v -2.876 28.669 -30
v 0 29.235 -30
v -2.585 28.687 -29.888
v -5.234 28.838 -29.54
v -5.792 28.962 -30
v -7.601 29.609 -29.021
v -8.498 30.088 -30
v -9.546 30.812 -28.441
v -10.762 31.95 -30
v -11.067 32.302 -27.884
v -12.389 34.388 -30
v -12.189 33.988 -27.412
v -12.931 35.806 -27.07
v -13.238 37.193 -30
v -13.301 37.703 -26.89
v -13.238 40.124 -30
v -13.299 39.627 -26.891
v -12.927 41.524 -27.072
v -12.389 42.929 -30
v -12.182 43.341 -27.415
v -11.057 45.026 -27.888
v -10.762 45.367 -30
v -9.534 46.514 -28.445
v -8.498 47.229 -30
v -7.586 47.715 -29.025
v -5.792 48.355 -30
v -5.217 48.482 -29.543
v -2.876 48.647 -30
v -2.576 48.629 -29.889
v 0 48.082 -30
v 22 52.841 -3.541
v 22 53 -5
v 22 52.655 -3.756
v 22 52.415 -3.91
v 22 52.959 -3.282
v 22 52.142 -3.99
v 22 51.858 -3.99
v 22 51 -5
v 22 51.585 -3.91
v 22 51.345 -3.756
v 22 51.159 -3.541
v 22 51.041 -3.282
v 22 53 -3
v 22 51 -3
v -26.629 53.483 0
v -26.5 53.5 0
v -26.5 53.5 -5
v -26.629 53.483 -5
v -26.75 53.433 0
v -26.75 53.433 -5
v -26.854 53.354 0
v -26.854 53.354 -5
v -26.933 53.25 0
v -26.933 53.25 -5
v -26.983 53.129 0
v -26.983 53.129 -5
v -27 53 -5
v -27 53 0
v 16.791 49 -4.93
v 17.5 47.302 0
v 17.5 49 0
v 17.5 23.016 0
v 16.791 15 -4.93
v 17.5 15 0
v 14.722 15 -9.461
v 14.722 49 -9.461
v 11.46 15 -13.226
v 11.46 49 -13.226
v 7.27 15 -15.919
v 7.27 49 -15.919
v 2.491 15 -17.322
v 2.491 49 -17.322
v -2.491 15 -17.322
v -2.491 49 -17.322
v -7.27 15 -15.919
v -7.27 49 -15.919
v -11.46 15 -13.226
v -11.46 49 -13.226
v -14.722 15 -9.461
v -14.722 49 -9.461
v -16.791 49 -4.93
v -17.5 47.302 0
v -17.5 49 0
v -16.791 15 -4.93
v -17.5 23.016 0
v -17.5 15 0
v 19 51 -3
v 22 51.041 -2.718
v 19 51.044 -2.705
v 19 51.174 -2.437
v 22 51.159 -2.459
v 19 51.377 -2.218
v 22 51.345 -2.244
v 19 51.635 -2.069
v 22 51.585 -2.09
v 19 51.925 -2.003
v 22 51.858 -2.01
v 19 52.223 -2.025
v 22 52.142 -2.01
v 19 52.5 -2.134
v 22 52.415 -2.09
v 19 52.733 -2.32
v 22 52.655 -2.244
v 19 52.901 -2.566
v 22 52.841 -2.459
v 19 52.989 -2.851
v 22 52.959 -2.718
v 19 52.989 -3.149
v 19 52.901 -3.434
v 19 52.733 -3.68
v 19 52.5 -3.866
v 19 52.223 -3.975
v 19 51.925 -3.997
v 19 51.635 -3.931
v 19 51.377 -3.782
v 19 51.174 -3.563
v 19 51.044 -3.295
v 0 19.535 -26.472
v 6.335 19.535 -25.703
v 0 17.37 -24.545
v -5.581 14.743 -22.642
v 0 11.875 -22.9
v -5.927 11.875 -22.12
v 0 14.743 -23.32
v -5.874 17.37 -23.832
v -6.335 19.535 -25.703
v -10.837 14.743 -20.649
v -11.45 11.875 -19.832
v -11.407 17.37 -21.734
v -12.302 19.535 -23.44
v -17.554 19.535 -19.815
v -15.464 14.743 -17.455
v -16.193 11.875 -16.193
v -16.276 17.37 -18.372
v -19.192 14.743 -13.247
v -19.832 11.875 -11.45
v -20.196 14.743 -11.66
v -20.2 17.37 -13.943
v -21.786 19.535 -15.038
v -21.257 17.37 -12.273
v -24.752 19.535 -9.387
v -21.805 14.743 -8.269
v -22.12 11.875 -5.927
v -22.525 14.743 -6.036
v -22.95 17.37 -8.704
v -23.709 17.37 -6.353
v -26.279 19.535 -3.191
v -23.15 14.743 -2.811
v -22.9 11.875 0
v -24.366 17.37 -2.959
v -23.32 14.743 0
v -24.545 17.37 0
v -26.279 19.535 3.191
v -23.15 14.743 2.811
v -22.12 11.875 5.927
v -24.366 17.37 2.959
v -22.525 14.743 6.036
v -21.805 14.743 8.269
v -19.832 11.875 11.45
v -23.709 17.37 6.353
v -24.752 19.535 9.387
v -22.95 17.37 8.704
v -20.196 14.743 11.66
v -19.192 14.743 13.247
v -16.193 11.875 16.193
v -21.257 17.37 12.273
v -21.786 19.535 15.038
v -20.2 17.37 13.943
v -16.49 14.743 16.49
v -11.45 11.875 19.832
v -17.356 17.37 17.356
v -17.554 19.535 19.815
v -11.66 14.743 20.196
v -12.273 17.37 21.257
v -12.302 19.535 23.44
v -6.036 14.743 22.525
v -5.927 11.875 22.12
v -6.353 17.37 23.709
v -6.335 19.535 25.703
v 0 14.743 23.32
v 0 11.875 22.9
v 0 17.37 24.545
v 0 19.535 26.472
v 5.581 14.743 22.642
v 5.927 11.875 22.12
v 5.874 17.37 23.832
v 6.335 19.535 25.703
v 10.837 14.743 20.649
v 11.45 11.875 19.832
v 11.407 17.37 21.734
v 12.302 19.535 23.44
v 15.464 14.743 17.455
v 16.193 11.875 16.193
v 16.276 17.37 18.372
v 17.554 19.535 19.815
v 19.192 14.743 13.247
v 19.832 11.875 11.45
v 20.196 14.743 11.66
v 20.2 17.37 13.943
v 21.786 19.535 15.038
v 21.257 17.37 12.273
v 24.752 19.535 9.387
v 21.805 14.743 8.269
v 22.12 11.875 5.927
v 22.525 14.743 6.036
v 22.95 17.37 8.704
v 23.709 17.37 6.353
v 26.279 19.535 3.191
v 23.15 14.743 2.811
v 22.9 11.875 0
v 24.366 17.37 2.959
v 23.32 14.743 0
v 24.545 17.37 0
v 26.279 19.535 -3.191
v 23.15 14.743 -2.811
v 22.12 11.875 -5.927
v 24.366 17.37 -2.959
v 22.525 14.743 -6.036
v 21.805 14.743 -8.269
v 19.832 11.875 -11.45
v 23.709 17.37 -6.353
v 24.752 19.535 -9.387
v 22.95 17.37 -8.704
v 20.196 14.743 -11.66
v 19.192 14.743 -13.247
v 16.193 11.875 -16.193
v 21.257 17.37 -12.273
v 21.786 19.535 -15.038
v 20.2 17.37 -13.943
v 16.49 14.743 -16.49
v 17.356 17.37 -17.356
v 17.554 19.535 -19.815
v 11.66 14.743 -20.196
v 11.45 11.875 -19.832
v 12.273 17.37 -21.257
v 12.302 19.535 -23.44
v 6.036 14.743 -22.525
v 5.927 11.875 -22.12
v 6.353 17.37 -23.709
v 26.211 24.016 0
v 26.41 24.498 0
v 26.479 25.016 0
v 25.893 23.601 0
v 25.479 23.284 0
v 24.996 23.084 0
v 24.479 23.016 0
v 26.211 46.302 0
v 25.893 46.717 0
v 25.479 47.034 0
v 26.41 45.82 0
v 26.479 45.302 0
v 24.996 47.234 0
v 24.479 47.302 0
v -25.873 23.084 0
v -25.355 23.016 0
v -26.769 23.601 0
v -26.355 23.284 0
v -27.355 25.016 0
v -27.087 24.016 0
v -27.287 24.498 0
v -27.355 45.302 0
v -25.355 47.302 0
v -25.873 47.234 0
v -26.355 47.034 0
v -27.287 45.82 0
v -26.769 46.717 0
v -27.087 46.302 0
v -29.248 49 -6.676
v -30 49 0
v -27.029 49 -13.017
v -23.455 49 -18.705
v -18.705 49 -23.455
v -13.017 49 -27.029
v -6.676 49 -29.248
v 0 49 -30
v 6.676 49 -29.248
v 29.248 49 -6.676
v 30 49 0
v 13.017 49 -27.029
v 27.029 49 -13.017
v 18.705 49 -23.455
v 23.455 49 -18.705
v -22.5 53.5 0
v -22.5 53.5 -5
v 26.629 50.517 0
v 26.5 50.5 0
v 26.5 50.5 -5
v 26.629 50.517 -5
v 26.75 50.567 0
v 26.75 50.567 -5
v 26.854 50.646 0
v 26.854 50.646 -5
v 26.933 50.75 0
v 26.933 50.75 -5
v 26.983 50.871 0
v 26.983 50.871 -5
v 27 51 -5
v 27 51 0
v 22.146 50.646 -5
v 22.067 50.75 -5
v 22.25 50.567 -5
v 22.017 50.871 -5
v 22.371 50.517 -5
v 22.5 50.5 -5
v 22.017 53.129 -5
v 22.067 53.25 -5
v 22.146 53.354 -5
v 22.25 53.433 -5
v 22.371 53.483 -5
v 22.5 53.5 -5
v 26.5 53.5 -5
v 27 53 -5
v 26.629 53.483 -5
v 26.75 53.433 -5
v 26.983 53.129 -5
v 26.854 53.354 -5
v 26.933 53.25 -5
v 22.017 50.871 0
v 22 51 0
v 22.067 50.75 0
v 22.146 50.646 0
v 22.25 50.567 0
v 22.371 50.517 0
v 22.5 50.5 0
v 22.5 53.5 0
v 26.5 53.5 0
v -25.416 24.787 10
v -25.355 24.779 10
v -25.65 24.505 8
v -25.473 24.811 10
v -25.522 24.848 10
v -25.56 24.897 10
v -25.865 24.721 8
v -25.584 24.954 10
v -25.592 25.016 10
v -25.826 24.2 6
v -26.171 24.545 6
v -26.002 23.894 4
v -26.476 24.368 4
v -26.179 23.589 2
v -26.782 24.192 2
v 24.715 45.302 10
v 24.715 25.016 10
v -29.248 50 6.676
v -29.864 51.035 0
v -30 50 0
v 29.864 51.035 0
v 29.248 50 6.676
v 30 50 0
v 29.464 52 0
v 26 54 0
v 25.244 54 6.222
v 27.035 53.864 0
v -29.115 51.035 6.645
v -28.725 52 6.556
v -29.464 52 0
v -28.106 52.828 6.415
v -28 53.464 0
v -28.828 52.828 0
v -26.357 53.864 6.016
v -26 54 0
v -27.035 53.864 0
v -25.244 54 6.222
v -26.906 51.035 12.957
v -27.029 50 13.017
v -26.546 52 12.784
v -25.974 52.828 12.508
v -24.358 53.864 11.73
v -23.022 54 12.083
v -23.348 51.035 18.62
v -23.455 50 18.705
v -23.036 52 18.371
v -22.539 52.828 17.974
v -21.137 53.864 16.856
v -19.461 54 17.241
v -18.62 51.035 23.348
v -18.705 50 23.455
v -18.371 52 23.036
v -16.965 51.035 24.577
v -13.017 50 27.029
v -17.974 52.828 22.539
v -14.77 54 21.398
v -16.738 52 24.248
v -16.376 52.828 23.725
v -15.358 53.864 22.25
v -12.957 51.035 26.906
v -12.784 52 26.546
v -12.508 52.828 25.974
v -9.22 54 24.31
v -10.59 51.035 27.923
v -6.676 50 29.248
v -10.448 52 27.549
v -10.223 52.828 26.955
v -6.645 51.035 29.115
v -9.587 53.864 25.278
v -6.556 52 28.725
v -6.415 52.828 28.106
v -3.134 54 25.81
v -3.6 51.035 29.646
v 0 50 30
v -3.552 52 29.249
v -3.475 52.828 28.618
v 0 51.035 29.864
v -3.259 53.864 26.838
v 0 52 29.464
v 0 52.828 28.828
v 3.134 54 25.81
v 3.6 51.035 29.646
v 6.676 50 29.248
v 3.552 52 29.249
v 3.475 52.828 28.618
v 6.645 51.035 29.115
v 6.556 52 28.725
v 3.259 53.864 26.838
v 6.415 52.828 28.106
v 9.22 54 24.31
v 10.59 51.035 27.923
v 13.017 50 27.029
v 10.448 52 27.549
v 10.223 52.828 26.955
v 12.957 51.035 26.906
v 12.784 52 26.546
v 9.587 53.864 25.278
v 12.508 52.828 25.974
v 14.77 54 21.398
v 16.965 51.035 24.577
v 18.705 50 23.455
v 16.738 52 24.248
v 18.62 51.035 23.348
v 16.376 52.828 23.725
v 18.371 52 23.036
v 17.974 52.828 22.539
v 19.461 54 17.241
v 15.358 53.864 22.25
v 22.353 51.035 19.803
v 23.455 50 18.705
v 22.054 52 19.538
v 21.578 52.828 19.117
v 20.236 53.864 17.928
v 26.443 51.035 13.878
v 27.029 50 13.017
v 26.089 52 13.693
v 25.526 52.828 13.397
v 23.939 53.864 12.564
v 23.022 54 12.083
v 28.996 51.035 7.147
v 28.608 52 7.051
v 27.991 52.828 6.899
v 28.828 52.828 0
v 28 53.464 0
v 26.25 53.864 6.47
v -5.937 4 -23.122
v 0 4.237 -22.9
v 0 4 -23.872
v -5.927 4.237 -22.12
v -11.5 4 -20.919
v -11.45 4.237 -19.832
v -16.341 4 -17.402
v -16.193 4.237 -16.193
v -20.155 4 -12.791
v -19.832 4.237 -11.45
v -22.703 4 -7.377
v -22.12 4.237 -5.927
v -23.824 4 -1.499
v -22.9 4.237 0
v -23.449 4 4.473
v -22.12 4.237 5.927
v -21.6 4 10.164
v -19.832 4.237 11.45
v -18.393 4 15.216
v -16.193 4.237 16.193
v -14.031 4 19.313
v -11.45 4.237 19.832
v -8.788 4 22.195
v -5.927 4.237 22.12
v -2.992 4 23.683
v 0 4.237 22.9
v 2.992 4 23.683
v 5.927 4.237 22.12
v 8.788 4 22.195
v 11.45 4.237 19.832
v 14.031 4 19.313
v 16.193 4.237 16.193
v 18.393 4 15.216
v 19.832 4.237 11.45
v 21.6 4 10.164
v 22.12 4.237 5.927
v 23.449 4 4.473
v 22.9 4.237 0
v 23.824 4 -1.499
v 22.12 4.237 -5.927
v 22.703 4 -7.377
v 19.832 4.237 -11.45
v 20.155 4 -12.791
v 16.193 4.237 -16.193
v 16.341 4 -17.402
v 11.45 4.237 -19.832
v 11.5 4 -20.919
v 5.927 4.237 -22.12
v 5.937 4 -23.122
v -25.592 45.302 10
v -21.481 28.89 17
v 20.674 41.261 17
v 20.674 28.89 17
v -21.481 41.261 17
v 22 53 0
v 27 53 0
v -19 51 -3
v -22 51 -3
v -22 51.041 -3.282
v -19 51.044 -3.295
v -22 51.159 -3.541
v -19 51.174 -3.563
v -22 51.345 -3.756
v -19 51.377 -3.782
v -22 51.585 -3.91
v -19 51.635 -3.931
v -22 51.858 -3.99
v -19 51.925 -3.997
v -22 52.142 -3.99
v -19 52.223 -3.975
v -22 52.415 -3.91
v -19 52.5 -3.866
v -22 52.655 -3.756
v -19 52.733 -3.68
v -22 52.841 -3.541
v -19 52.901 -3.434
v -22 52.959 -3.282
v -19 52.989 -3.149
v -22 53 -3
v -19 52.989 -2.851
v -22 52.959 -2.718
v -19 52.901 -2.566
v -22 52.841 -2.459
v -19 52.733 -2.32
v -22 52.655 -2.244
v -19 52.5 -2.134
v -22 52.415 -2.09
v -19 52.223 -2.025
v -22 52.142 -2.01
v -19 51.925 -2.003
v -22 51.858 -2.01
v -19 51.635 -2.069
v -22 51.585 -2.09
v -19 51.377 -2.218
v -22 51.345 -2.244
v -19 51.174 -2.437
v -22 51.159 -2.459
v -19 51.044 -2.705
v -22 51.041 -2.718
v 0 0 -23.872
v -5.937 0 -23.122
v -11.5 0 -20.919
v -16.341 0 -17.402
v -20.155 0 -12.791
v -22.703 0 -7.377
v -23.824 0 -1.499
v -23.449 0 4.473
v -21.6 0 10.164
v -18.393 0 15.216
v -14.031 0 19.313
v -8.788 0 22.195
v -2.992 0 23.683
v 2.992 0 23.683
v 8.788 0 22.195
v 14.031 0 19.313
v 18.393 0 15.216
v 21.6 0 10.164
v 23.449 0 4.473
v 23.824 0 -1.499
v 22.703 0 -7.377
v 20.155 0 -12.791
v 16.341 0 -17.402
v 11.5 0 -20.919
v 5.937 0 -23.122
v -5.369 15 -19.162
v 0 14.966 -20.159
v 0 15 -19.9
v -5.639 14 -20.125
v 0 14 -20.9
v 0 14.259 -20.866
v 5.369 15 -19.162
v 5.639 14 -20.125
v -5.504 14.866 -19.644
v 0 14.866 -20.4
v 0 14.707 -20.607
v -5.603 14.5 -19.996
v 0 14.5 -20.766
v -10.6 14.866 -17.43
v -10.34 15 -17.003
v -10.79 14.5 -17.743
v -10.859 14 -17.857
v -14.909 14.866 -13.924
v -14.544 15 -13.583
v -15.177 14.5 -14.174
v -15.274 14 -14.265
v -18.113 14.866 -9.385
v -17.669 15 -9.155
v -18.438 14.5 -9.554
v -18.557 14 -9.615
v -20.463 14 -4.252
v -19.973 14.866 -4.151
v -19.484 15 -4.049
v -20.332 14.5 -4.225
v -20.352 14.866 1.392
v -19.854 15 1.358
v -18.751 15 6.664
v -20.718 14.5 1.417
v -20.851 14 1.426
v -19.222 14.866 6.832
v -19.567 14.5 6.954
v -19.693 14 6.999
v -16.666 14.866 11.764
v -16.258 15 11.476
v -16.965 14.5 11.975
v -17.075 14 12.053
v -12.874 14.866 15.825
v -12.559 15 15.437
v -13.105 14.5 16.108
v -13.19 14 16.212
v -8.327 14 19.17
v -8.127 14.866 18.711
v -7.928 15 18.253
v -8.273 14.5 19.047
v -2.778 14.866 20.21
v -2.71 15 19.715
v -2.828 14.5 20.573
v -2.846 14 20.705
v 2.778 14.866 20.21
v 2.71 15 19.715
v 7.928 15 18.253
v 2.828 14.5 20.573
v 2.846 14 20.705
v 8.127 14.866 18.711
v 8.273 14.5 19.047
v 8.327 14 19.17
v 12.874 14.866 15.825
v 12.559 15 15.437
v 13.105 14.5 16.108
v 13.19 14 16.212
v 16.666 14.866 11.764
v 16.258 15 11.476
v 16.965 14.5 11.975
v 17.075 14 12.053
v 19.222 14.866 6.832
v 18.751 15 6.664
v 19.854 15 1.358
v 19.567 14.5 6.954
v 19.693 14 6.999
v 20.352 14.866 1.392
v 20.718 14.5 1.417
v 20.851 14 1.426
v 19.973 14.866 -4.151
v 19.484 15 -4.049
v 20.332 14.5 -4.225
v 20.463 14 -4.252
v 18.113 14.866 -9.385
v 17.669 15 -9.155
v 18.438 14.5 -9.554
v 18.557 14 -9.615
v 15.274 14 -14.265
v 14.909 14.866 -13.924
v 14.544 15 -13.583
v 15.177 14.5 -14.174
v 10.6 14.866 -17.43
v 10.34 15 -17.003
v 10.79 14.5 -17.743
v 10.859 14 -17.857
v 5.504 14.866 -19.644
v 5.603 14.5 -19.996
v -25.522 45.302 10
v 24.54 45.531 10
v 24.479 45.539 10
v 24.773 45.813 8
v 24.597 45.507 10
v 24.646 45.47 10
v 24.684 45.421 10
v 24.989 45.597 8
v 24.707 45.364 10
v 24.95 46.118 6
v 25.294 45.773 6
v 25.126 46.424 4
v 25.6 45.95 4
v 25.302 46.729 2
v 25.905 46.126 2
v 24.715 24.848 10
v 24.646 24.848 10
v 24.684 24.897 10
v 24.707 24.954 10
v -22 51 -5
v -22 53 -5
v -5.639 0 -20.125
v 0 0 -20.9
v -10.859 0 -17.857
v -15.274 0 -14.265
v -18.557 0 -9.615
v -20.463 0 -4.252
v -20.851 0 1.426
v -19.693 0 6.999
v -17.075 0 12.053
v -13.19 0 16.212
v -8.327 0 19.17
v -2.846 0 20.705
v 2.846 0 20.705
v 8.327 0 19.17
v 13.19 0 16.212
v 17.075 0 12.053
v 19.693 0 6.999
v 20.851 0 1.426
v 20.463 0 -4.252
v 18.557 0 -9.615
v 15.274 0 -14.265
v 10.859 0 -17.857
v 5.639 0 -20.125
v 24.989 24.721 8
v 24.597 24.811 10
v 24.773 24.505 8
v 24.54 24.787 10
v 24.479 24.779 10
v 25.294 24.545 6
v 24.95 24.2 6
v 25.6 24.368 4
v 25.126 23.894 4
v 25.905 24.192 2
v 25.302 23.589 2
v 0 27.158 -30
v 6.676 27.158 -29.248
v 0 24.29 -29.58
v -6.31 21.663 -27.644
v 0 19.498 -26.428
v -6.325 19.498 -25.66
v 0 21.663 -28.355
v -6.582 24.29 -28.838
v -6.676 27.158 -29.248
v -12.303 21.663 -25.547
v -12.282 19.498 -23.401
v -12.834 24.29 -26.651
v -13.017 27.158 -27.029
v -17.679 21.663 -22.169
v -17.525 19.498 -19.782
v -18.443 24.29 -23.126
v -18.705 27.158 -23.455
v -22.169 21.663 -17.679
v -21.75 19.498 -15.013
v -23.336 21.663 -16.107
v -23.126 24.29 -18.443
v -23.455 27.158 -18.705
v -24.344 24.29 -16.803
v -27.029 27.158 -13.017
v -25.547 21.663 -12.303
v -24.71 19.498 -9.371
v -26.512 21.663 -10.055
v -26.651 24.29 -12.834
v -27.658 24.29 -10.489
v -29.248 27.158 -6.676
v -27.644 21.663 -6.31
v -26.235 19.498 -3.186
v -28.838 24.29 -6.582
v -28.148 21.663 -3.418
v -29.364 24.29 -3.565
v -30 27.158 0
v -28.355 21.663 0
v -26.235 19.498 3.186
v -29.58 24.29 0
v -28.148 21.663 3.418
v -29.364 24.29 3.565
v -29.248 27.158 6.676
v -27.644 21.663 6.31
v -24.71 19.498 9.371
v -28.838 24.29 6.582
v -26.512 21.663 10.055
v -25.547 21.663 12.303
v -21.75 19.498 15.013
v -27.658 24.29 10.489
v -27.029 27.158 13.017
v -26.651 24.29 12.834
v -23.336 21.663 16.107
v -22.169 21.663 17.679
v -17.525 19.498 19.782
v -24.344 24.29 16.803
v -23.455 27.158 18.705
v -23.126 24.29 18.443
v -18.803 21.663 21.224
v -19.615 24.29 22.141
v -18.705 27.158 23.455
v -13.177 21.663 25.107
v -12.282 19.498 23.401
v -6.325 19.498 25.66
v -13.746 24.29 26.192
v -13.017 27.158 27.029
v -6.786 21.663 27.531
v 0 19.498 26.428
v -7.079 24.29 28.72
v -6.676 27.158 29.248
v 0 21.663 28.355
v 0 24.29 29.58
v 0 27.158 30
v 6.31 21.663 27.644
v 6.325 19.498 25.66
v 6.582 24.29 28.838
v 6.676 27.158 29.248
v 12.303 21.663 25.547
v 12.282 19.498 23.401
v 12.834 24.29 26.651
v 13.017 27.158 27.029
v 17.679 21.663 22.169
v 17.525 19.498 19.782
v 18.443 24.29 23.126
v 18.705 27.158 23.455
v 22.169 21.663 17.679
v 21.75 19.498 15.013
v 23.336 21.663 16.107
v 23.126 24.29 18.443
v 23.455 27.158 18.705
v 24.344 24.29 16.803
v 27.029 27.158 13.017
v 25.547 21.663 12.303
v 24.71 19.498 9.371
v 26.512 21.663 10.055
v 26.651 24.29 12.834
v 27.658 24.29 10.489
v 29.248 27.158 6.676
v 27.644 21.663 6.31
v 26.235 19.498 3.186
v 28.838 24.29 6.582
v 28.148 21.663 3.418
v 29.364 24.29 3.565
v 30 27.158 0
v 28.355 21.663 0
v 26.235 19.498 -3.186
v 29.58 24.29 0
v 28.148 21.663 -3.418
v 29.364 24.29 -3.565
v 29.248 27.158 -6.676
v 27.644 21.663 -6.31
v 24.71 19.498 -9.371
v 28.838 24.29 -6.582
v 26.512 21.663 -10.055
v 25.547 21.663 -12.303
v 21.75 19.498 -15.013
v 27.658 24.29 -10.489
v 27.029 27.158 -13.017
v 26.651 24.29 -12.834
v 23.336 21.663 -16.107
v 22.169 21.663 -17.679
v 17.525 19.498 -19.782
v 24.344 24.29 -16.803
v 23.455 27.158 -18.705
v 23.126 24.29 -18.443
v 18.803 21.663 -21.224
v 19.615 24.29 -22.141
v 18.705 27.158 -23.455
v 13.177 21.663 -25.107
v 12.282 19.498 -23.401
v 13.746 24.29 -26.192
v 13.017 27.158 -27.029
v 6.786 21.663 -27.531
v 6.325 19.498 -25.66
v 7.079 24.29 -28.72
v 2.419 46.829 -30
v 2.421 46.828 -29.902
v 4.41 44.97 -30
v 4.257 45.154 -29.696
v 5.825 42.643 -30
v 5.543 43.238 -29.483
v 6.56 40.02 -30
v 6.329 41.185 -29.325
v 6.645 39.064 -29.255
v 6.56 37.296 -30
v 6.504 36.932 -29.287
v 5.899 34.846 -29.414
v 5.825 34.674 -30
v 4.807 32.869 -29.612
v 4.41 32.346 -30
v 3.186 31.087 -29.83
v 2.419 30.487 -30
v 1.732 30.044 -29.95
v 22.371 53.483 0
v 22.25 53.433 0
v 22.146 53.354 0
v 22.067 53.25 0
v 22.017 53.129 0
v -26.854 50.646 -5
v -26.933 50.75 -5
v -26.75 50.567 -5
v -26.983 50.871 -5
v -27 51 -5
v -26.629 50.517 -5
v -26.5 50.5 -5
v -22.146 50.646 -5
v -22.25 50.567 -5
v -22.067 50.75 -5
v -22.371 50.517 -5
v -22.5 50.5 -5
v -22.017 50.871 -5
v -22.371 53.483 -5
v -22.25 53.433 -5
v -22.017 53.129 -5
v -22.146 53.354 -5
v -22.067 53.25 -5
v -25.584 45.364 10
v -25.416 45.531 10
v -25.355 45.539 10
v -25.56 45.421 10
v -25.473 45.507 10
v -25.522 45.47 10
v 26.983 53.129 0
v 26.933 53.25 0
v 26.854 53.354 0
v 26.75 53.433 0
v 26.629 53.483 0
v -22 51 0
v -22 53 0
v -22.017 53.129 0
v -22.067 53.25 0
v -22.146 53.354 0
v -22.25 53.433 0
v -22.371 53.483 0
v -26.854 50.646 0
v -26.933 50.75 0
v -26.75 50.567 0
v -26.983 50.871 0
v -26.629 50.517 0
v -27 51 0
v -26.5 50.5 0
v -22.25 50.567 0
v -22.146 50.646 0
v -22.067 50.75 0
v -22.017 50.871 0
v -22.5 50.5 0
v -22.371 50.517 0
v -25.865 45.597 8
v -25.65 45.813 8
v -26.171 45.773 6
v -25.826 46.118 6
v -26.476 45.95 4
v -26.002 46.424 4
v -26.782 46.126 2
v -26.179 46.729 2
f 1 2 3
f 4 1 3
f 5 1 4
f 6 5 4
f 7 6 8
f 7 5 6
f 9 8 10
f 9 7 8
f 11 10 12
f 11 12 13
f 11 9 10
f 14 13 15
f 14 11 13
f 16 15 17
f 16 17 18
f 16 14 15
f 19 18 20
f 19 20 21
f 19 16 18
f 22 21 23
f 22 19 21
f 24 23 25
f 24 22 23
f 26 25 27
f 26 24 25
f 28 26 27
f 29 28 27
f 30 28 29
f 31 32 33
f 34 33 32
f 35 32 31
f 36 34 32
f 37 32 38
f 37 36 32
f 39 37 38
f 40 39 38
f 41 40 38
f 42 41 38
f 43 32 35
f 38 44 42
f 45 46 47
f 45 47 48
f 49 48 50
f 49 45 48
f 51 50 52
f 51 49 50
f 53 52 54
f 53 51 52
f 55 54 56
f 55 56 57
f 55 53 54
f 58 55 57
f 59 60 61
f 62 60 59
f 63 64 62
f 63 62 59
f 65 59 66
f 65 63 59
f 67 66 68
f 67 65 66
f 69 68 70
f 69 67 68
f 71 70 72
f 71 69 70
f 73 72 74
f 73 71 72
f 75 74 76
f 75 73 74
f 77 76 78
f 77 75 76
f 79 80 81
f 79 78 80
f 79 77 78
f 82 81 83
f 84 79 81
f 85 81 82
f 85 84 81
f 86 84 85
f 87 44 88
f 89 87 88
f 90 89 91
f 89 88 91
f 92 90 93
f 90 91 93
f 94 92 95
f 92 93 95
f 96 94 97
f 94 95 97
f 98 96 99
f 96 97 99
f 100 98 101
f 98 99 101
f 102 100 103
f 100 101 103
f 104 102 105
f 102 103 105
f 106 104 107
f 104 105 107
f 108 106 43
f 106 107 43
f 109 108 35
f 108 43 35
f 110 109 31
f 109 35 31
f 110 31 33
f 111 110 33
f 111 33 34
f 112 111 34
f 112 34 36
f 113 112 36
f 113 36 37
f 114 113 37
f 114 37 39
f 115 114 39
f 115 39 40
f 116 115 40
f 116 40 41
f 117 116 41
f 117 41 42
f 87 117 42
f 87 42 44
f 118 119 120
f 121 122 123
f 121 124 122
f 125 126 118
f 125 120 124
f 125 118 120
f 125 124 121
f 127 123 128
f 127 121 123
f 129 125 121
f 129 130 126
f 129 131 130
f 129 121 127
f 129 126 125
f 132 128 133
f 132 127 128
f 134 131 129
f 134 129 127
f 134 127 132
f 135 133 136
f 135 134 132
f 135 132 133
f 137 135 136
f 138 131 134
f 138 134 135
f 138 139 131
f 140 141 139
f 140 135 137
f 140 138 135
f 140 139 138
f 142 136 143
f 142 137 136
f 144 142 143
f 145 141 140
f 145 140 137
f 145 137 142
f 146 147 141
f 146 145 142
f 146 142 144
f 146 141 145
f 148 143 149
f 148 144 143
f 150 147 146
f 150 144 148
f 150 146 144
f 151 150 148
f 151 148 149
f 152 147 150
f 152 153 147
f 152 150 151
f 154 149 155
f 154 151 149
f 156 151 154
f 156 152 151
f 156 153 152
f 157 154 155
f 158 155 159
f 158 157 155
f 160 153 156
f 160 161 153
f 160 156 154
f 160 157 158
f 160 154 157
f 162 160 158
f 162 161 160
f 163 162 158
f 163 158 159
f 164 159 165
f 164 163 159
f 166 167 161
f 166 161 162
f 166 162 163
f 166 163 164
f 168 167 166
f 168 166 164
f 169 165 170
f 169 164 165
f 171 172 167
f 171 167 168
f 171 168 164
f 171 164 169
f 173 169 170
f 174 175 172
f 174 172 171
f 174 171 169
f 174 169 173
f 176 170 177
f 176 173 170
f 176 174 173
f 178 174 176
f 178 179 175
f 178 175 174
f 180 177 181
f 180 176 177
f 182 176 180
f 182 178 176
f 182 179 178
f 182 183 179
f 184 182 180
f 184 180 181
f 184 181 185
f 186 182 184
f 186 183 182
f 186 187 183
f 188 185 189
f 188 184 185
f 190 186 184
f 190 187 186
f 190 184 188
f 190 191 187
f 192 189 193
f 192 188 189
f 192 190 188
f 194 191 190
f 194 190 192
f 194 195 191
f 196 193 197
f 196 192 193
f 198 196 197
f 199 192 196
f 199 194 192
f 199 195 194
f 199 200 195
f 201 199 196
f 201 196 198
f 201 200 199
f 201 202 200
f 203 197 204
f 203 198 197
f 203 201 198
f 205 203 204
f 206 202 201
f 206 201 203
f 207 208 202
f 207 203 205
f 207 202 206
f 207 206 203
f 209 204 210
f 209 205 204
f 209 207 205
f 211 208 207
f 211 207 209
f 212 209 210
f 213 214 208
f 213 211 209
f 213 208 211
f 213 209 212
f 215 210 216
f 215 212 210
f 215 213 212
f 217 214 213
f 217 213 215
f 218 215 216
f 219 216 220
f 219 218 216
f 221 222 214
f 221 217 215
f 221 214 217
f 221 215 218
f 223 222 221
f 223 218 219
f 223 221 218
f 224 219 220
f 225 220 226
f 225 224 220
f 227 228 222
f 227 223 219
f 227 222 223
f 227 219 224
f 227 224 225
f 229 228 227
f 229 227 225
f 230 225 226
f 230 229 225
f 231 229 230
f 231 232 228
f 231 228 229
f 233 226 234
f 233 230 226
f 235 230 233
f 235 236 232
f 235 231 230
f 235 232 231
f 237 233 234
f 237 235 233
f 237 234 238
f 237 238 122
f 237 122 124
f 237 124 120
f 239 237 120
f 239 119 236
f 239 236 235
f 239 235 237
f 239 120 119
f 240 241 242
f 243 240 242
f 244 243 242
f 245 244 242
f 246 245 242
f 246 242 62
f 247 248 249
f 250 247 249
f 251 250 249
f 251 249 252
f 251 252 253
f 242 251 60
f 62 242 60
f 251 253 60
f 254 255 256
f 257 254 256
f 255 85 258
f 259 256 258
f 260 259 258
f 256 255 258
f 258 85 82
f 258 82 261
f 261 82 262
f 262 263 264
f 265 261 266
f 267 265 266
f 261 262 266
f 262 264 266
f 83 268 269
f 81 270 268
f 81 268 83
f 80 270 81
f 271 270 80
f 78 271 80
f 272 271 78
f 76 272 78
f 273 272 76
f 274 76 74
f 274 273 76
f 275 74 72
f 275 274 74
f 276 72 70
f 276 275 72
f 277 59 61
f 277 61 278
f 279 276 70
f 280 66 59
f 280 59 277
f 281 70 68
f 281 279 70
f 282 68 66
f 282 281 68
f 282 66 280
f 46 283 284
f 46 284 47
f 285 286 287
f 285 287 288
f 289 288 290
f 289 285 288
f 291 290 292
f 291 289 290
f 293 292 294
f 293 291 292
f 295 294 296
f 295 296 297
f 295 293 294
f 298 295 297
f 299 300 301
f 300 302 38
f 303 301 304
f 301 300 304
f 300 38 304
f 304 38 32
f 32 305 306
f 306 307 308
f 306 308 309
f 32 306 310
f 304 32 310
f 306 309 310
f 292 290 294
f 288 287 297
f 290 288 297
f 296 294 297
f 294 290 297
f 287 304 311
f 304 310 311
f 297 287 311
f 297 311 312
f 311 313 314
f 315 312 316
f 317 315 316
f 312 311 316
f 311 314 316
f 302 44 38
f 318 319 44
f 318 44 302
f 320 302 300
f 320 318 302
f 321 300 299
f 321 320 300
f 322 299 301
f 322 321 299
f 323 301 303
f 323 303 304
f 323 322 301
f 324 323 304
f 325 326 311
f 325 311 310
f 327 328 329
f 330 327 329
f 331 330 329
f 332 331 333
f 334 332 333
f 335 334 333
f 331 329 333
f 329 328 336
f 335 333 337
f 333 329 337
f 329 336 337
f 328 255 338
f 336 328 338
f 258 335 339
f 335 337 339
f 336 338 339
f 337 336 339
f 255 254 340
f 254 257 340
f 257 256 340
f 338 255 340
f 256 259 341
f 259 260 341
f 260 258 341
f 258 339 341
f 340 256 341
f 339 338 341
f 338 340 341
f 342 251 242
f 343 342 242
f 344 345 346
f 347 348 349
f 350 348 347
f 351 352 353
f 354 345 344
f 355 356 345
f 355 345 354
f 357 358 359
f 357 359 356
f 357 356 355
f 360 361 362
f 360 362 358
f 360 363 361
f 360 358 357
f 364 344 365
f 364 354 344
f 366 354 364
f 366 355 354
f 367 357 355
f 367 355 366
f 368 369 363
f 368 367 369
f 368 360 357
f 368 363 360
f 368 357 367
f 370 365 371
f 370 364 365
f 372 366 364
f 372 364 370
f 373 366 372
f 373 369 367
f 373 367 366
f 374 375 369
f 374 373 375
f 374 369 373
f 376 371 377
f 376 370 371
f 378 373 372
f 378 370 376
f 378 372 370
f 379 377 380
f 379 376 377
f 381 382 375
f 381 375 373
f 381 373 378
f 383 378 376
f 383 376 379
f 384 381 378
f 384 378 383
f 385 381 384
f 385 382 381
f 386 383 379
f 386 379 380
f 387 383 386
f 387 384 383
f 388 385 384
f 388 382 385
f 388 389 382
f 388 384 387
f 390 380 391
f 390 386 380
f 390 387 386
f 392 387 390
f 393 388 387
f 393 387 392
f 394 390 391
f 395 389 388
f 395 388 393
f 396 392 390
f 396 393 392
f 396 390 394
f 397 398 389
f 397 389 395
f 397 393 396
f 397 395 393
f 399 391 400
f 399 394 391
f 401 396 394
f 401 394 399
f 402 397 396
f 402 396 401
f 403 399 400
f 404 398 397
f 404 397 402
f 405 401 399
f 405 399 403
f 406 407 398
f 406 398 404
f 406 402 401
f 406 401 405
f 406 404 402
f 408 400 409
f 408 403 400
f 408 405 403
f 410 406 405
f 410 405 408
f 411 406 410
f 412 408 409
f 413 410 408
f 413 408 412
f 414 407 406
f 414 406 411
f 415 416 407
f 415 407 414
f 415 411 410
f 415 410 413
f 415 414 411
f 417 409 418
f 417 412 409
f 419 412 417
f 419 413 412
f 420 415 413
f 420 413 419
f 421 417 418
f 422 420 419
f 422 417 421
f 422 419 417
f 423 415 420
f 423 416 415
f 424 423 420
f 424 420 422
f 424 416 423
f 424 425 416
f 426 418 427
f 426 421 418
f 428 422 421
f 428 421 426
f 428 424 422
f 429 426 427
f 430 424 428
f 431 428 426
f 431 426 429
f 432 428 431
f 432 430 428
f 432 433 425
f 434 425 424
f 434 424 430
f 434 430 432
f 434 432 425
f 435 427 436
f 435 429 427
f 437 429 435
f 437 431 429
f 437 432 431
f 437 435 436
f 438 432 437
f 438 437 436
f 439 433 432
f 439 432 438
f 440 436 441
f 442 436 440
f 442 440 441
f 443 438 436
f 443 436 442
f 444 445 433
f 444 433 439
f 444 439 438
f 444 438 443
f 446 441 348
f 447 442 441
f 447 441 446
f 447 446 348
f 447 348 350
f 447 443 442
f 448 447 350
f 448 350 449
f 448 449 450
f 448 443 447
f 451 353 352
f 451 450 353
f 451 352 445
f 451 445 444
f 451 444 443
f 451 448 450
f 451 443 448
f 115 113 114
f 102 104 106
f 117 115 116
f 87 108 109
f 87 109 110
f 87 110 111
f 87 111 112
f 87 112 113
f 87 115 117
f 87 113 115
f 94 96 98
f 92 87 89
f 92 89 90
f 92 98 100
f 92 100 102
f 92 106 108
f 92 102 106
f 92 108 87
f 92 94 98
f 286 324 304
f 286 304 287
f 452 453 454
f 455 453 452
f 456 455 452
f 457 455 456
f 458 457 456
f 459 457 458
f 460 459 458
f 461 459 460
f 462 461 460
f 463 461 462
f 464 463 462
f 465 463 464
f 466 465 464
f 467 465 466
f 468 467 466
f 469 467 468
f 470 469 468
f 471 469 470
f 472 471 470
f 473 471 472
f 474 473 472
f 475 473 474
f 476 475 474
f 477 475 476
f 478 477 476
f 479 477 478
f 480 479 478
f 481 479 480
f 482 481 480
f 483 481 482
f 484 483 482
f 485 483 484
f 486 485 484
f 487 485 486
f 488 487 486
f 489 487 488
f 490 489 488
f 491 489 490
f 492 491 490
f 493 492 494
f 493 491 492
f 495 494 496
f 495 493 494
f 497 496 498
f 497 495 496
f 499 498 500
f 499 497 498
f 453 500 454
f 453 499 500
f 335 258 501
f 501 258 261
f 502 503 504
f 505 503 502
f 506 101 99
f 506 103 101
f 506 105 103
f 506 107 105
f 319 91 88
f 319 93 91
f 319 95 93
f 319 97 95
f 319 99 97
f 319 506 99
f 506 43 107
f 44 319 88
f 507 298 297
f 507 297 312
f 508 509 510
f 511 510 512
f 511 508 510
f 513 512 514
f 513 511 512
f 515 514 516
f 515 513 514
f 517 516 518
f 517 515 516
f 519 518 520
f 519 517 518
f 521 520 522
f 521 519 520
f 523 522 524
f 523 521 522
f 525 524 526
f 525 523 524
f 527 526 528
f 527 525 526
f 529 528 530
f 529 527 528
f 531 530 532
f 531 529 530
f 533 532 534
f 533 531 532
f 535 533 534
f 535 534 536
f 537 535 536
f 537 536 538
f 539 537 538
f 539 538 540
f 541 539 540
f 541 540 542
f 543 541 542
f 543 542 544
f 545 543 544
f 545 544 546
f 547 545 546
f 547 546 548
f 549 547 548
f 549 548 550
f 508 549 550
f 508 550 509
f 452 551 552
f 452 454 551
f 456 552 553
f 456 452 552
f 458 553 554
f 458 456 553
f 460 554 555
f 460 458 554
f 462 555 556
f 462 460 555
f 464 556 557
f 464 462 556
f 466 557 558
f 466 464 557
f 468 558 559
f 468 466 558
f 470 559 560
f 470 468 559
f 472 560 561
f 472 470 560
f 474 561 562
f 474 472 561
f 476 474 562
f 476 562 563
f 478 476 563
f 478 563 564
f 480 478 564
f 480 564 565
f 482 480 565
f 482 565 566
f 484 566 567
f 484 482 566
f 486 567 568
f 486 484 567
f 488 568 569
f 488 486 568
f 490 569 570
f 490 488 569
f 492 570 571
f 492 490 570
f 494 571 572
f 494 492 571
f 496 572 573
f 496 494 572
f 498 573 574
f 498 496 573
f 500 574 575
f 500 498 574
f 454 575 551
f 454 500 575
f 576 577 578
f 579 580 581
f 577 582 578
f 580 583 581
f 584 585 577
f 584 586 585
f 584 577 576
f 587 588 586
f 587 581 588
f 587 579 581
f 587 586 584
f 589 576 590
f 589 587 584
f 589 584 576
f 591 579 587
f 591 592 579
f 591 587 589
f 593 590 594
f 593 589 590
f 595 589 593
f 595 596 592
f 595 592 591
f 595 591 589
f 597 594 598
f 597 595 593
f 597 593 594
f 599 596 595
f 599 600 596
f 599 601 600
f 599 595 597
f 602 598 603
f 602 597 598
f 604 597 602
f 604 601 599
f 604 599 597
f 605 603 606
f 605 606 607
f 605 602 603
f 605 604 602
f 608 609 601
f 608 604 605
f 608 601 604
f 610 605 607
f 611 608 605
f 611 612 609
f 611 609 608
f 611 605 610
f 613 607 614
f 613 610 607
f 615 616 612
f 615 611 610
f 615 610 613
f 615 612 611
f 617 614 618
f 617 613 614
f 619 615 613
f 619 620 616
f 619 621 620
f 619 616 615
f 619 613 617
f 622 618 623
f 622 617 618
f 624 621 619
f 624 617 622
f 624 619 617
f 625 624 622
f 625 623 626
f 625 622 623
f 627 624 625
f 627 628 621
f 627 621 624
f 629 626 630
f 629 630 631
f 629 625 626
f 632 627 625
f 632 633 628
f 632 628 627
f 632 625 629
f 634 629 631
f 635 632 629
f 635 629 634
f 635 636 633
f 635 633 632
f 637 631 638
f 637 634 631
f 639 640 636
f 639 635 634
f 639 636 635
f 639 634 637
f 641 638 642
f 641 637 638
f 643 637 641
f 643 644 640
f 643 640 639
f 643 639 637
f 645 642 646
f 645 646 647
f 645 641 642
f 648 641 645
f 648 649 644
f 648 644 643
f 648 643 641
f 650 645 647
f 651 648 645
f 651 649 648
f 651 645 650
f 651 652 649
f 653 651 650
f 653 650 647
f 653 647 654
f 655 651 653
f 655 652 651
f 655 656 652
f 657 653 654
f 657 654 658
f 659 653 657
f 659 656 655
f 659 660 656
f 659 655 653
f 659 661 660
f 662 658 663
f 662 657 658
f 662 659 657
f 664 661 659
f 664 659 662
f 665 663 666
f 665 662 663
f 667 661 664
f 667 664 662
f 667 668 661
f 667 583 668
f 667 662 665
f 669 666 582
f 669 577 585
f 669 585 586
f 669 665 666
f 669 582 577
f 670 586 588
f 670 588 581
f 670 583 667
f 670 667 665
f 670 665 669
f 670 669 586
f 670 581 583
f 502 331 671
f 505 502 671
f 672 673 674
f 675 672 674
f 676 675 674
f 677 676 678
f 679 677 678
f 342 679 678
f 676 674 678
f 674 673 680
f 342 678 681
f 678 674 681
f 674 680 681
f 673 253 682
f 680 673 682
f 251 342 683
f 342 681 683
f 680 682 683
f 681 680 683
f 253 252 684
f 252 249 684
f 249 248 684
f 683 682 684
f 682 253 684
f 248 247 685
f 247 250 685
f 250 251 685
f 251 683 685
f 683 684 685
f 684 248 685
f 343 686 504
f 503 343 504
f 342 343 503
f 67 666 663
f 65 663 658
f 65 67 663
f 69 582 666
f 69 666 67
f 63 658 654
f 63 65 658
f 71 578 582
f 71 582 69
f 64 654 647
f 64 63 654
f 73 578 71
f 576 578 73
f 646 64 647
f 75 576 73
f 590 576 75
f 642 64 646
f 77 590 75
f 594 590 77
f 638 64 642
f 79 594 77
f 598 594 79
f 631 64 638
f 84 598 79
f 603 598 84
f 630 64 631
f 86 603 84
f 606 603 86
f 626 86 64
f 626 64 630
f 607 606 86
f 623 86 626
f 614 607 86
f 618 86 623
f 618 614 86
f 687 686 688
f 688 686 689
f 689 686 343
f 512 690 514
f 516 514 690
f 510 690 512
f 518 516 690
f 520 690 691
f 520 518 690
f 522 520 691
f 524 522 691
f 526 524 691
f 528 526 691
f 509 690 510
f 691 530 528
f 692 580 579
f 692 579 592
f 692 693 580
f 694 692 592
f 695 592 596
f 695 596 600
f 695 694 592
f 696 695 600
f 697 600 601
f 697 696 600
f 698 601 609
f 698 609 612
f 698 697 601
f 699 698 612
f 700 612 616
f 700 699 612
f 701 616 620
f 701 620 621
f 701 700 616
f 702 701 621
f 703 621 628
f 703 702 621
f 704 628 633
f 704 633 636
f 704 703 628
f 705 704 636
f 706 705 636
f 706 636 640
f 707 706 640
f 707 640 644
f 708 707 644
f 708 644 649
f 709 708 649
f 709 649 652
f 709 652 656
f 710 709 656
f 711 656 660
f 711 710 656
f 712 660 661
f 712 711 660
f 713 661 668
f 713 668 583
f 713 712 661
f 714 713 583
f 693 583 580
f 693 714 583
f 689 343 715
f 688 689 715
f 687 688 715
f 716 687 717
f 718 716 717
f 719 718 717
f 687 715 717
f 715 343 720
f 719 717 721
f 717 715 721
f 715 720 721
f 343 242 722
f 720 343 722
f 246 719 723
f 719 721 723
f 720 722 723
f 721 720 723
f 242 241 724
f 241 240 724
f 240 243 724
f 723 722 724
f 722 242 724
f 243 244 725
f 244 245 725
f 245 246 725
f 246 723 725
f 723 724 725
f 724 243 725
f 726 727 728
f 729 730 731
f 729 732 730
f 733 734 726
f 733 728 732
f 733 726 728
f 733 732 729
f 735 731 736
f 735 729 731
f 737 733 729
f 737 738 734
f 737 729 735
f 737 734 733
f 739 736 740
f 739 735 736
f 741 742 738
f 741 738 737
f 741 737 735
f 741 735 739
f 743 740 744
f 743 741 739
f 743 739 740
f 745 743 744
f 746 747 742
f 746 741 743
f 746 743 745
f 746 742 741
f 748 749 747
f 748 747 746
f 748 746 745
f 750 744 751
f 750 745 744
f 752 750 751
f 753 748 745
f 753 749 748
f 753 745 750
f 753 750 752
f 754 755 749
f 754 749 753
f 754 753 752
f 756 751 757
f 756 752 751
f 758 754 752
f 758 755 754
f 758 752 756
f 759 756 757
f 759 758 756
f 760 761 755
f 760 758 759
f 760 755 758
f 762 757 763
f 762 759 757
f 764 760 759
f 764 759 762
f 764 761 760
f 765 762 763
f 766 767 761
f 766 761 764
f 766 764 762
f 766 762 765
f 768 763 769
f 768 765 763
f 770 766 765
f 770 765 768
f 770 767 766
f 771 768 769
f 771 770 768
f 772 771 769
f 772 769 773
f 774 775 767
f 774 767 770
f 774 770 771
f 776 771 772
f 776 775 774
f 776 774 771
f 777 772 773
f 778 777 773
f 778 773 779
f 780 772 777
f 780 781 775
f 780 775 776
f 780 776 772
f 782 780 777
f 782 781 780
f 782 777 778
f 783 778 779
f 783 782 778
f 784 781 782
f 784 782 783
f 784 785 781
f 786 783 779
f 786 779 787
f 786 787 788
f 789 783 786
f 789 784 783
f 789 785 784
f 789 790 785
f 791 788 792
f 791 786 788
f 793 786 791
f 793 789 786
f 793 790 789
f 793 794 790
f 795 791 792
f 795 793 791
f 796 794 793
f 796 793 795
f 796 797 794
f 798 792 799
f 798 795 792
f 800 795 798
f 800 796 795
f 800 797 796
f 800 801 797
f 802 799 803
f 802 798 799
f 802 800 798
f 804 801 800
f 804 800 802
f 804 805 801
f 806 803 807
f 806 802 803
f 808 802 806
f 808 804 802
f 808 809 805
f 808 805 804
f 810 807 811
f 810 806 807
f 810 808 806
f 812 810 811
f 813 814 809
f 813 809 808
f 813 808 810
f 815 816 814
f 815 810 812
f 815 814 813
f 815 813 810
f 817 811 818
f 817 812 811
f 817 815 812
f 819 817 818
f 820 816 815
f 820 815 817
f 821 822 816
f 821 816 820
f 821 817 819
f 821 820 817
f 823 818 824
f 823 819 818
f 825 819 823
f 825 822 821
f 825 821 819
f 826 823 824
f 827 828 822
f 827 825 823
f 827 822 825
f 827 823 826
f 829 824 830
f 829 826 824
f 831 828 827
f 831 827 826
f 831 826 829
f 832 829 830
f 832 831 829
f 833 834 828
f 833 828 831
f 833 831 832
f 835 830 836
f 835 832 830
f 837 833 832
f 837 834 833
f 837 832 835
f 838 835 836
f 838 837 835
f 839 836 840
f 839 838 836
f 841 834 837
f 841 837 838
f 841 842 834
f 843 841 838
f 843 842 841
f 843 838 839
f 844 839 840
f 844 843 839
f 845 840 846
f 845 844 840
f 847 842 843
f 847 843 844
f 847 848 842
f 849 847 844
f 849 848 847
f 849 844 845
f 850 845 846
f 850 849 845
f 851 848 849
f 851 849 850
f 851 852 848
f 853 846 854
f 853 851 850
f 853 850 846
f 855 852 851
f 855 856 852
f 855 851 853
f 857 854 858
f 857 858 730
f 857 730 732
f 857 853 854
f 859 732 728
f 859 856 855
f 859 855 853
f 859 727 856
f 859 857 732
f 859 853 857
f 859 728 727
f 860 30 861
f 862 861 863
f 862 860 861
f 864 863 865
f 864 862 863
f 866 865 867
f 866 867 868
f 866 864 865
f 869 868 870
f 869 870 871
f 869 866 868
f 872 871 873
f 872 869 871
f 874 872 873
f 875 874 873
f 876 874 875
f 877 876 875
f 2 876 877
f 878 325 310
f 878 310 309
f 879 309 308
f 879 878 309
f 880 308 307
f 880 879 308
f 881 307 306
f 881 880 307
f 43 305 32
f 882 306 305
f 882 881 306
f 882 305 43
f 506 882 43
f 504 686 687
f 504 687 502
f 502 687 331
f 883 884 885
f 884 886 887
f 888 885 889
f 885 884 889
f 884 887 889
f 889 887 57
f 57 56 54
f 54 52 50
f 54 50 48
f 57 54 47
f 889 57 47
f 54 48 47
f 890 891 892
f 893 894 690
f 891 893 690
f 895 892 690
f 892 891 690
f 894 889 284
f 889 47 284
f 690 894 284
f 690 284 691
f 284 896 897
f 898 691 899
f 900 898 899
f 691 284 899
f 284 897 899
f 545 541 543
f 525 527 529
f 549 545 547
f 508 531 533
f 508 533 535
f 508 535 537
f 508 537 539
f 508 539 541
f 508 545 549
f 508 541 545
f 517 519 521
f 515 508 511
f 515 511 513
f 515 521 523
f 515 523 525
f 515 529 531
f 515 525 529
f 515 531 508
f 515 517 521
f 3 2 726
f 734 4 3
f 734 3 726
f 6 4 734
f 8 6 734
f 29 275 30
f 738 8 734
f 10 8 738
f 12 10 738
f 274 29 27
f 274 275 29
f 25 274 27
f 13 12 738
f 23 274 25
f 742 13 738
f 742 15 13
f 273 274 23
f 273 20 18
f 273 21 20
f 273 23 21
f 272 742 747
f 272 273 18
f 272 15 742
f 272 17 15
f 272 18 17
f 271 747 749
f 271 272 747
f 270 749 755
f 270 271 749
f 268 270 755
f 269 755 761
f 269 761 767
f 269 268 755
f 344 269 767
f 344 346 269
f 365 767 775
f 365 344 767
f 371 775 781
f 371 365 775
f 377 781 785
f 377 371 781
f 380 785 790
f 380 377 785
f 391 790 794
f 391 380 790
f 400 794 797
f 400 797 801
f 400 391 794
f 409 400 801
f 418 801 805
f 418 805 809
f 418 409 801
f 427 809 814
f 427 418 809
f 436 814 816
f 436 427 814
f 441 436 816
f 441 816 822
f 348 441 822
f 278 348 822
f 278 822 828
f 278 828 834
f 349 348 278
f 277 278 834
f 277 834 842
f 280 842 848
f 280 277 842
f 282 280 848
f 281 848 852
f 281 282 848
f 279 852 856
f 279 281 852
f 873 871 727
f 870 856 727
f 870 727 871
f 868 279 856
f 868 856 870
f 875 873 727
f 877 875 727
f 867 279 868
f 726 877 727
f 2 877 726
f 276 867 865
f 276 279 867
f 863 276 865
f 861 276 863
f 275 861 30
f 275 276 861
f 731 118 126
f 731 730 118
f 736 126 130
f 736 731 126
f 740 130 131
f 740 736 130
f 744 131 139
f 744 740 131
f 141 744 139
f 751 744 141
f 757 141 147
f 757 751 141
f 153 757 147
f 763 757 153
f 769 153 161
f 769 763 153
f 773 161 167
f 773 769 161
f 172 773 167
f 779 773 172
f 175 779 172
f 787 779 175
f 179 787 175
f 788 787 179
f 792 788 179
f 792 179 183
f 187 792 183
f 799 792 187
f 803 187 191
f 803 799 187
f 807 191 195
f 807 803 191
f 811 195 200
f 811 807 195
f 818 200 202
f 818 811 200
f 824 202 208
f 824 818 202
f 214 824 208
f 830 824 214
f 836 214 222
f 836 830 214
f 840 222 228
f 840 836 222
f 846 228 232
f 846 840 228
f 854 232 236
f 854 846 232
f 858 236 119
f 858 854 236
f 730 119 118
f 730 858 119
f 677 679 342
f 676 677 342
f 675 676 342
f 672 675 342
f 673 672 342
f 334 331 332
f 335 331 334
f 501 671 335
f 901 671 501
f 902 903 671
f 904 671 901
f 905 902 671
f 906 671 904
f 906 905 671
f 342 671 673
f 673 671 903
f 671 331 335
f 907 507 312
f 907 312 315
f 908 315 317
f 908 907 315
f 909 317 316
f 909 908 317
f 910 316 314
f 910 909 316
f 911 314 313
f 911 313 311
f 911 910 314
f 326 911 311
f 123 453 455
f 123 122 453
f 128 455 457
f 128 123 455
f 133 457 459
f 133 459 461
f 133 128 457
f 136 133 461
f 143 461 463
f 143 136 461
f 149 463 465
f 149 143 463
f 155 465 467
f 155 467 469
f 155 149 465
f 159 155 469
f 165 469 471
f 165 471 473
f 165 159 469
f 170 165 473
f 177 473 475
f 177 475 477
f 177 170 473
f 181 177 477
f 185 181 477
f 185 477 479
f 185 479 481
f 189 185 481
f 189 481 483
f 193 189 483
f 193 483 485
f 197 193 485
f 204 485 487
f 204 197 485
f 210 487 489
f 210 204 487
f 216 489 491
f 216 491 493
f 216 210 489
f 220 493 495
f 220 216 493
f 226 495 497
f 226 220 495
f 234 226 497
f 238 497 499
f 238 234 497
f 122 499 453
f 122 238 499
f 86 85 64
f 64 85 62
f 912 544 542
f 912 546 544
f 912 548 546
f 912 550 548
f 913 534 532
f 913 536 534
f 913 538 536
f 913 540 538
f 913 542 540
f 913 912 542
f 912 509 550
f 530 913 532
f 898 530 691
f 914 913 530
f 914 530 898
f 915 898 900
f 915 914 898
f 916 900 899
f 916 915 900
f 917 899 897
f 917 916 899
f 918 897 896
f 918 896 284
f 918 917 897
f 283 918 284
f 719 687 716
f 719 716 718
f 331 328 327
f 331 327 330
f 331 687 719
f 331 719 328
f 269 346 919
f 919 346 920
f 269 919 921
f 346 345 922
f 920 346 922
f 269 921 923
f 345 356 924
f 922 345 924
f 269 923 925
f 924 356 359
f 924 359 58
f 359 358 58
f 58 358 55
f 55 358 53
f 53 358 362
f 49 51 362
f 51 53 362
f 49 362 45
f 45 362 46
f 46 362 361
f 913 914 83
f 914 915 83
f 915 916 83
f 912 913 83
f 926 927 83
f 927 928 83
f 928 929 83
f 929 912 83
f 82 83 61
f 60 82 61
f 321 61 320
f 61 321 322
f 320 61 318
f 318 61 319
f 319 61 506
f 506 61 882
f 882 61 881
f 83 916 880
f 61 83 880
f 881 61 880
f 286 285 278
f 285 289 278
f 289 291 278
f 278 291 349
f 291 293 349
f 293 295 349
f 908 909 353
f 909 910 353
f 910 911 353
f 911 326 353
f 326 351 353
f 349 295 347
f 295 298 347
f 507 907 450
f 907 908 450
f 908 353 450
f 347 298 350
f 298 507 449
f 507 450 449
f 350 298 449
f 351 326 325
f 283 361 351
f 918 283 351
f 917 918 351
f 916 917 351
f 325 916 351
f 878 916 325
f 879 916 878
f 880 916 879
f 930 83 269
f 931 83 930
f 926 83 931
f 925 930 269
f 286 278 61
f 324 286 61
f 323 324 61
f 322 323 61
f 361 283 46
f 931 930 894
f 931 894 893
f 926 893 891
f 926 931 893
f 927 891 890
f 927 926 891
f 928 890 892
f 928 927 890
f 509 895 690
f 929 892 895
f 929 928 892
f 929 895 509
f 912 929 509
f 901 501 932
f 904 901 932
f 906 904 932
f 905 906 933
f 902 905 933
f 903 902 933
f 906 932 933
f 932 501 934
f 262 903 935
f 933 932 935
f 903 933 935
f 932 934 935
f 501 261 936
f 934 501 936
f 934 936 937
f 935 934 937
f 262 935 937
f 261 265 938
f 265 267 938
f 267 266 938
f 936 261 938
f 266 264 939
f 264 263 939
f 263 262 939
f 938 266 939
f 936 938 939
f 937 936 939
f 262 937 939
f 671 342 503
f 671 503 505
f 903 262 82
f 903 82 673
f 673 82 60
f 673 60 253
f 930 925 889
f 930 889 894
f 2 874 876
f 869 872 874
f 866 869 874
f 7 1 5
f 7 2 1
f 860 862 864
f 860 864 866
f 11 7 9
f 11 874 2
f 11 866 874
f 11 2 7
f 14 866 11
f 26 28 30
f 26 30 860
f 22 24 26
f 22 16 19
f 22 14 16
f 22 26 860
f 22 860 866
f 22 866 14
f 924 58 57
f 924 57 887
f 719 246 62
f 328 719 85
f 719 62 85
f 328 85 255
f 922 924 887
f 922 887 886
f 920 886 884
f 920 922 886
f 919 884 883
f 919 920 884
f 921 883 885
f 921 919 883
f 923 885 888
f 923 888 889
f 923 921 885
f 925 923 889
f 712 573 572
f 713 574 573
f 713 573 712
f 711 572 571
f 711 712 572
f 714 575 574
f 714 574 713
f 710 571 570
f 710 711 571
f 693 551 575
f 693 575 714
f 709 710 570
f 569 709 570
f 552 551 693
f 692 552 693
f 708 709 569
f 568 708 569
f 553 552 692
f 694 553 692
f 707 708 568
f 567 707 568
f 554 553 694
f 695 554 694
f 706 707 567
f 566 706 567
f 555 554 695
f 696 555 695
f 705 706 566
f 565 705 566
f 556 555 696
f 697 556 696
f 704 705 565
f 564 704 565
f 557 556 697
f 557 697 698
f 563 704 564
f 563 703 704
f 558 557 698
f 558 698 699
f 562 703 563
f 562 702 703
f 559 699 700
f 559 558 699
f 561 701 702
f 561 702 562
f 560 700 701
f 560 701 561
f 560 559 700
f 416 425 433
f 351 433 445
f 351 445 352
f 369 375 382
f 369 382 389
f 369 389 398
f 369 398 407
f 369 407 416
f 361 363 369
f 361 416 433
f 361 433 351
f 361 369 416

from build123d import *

# Parameters (mm, degrees)
SKETCH10_R              = 10
BOSS_EXTRUDE1_DEPTH     = 5
CUT_EXTRUDE3_DEPTH      = 45
CUT_EXTRUDE3_DEPTH_BACK = 20
CUT_EXTRUDE5_DEPTH      = 5
BOSS_EXTRUDE2_DEPTH     = 5
SKETCH14_R              = 1
BOSS_EXTRUDE3_DEPTH     = 3
BOSS_EXTRUDE4_START     = 3
SKETCH15_R              = 1
BOSS_EXTRUDE4_DEPTH     = 3
CUT_EXTRUDE6_DEPTH      = 10
CUT_EXTRUDE6_DRAFT      = -10
SKETCH18_W              = 50.237541655
SKETCH18_H              = 20.454146011
CUT_EXTRUDE7_DEPTH      = 7
CUT_EXTRUDE7_DRAFT      = -30


with BuildPart() as part:
    # Sketch1 → Revolve1 (revolve)
    with BuildSketch(Plane.XY, mode=Mode.PRIVATE) as revolve1_sk:
        with BuildLine():
            Line((20.9, 0), (23.871591838, 0))
            Line((23.871591838, 0), (23.871591838, 4))
            Line((23.871591838, 4), (22.9, 4.236662843))
            Line((22.9, 4.236662843), (22.9, 11.874576818))
            ThreePointArc((22.9, 11.874576818), (23.83692213, 16.100759435), (26.472123903, 19.535021249))
            Line((26.472123903, 19.535021249), (26.427876097, 19.497892931))
            ThreePointArc((26.427876097, 19.497892931), (29.06307787, 22.932154745), (30, 27.158337362))
            Line((30, 27.158337362), (30, 50))
            ThreePointArc((30, 50), (28.828427125, 52.828427125), (26, 54))
            Line((26, 54), (0, 54))
            Line((0, 54), (0, 15))
            Line((0, 15), (19.9, 15))
            ThreePointArc((19.9, 15), (20.607106781, 14.707106781), (20.9, 14))
            Line((20.9, 14), (20.9, 0))
        make_face()
    revolve(revolve1_sk.sketch.rotate(Axis((0, 0, 0), (0, 1, 0)), 90), axis=Axis((0, 0, 0), (0, 1, 0)))

    # Sketch10 → Boss-Extrude1 (add)
    with BuildSketch(Plane(origin=(0, 0, -30), x_dir=(-1, 0, 0), z_dir=(0, 0, -1))):
        with Locations((3.346345887, 38.658337362)):
            Circle(SKETCH10_R)
    extrude(amount=-BOSS_EXTRUDE1_DEPTH)

    # Sketch11 → Cut-Extrude3 (cut, two sides: drawn at the far end of the back side and taken through both)
    with BuildSketch(Plane(origin=(0, 17, 0), x_dir=(1, 0, 0), z_dir=(0, 1, 0)).offset(-CUT_EXTRUDE3_DEPTH_BACK)):
        with BuildLine():
            Line((-17.5, 0), (17.5, 0))
            ThreePointArc((17.5, 0), (0, 17.5), (-17.5, 0))
        make_face()
    extrude(amount=CUT_EXTRUDE3_DEPTH + CUT_EXTRUDE3_DEPTH_BACK, mode=Mode.SUBTRACT)

    # Sketch9 → Cut-Extrude5 (cut)
    with BuildSketch(Plane(origin=(0, 54, 0), x_dir=(1, 0, 0), z_dir=(0, 1, 0))):
        with BuildLine():
            Line((-30, 0), (30, 0))
            ThreePointArc((30, 0), (0, 30), (-30, 0))
        make_face()
    extrude(amount=-CUT_EXTRUDE5_DEPTH, mode=Mode.SUBTRACT)

    # Sketch13 → Boss-Extrude2 (add)
    with BuildSketch(Plane(origin=(0, 0, 0), x_dir=(-1, 0, 0), z_dir=(0, 0, -1))):
        with BuildLine():
            Line((22.5, 53.5), (26.5, 53.5))
            ThreePointArc((26.5, 53.5), (26.853553391, 53.353553391), (27, 53))
            Line((27, 53), (27, 51))
            ThreePointArc((27, 51), (26.853553391, 50.646446609), (26.5, 50.5))
            Line((26.5, 50.5), (22.5, 50.5))
            ThreePointArc((22.5, 50.5), (22.146446609, 50.646446609), (22, 51))
            Line((22, 51), (22, 53))
            ThreePointArc((22, 53), (22.146446609, 53.353553391), (22.5, 53.5))
        make_face()
        with BuildLine():
            Line((-26.5, 53.5), (-22.5, 53.5))
            ThreePointArc((-22.5, 53.5), (-22.146446609, 53.353553391), (-22, 53))
            Line((-22, 53), (-22, 51))
            ThreePointArc((-22, 51), (-22.146446609, 50.646446609), (-22.5, 50.5))
            Line((-22.5, 50.5), (-26.5, 50.5))
            ThreePointArc((-26.5, 50.5), (-26.853553391, 50.646446609), (-27, 51))
            Line((-27, 51), (-27, 53))
            ThreePointArc((-27, 53), (-26.853553391, 53.353553391), (-26.5, 53.5))
        make_face()
    extrude(amount=BOSS_EXTRUDE2_DEPTH)

    # Sketch14 → Boss-Extrude3 (add)
    with BuildSketch(Plane.ZY.offset(-22)):
        with Locations(Location((-3, 52, 0), (0, 0, 270))):
            Circle(SKETCH14_R)
    extrude(amount=BOSS_EXTRUDE3_DEPTH)

    # Sketch15 → Boss-Extrude4 (add)
    with BuildSketch(Plane(origin=(-22, 0, 0), x_dir=(0, 0, -1), z_dir=(1, 0, 0)).offset(BOSS_EXTRUDE4_START)):
        with Locations(Location((3, 52, 0), (0, 0, 270))):
            Circle(SKETCH15_R)
    extrude(amount=-BOSS_EXTRUDE4_DEPTH)


with BuildPart() as cut_extrude6_tool:
    # Sketch17 → Cut-Extrude6 (with draft: the straight prism first)
    with BuildSketch(Plane(origin=(0, 0, 0), x_dir=(-1, 0, 0), z_dir=(0, 0, -1))):
        with BuildLine():
            ThreePointArc((-24.47851765, 47.302362136), (-25.892731213, 46.716575698), (-26.47851765, 45.302362136))
            Line((-26.47851765, 45.302362136), (-26.47851765, 25.01560965))
            ThreePointArc((-26.47851765, 25.01560965), (-25.892731213, 23.601396087), (-24.47851765, 23.01560965))
            Line((-24.47851765, 23.01560965), (25.354900287, 23.01560965))
            ThreePointArc((25.354900287, 23.01560965), (26.769113849, 23.601396087), (27.354900287, 25.01560965))
            Line((27.354900287, 25.01560965), (27.354900287, 45.302362136))
            ThreePointArc((27.354900287, 45.302362136), (26.769113849, 46.716575698), (25.354900287, 47.302362136))
            Line((25.354900287, 47.302362136), (-24.47851765, 47.302362136))
        make_face()
    extrude(amount=-CUT_EXTRUDE6_DEPTH)
    # Cut-Extrude6: the draft: its side faces are tilted about the plane it starts from
    cut_extrude6_sides = [cut_extrude6_tool.faces().sort_by_distance(p)[0] for p in [
        (25.892731213, 46.716575698, 5),
        (26.47851765, 35.158985893, 5),
        (25.892731213, 23.601396087, 5),
        (-0.438191318, 23.01560965, 5),
        (-26.769113849, 23.601396087, 5),
        (-27.354900287, 35.158985893, 5),
        (-26.769113849, 46.716575698, 5),
        (-0.438191318, 47.302362136, 5),
    ]]
    draft(cut_extrude6_sides, Plane(origin=(0, 0, 0), x_dir=(-1, 0, 0), z_dir=(0, 0, -1)), CUT_EXTRUDE6_DRAFT)


with BuildPart() as part_1:
    add(part.part)

    # Cut-Extrude6: cut by cut_extrude6_tool
    add(cut_extrude6_tool.part, mode=Mode.SUBTRACT)


with BuildPart() as cut_extrude7_tool:
    # Sketch18 → Cut-Extrude7 (with draft: the straight prism first)
    with BuildSketch(Plane(origin=(0, 0, 10), x_dir=(-1, 0, 0), z_dir=(0, 0, -1))):
        with Locations((0.403522985, 35.07528913)):
            Rectangle(SKETCH18_W, SKETCH18_H)
    extrude(amount=-CUT_EXTRUDE7_DEPTH)
    # Cut-Extrude7: the draft: its side faces are tilted about the plane it starts from
    cut_extrude7_sides = [cut_extrude7_tool.faces().sort_by_distance(p)[0] for p in [
        (24.715247843, 35.07528913, 13.5),
        (-0.403522984, 24.848216125, 13.5),
        (-25.522293812, 35.07528913, 13.5),
        (-0.403522984, 45.302362136, 13.5),
    ]]
    draft(cut_extrude7_sides, Plane(origin=(0, 0, 10), x_dir=(-1, 0, 0), z_dir=(0, 0, -1)), CUT_EXTRUDE7_DRAFT)


with BuildPart() as part_2:
    add(part_1.part)

    # Cut-Extrude7: cut by cut_extrude7_tool
    add(cut_extrude7_tool.part, mode=Mode.SUBTRACT)


solid = part_2.part
